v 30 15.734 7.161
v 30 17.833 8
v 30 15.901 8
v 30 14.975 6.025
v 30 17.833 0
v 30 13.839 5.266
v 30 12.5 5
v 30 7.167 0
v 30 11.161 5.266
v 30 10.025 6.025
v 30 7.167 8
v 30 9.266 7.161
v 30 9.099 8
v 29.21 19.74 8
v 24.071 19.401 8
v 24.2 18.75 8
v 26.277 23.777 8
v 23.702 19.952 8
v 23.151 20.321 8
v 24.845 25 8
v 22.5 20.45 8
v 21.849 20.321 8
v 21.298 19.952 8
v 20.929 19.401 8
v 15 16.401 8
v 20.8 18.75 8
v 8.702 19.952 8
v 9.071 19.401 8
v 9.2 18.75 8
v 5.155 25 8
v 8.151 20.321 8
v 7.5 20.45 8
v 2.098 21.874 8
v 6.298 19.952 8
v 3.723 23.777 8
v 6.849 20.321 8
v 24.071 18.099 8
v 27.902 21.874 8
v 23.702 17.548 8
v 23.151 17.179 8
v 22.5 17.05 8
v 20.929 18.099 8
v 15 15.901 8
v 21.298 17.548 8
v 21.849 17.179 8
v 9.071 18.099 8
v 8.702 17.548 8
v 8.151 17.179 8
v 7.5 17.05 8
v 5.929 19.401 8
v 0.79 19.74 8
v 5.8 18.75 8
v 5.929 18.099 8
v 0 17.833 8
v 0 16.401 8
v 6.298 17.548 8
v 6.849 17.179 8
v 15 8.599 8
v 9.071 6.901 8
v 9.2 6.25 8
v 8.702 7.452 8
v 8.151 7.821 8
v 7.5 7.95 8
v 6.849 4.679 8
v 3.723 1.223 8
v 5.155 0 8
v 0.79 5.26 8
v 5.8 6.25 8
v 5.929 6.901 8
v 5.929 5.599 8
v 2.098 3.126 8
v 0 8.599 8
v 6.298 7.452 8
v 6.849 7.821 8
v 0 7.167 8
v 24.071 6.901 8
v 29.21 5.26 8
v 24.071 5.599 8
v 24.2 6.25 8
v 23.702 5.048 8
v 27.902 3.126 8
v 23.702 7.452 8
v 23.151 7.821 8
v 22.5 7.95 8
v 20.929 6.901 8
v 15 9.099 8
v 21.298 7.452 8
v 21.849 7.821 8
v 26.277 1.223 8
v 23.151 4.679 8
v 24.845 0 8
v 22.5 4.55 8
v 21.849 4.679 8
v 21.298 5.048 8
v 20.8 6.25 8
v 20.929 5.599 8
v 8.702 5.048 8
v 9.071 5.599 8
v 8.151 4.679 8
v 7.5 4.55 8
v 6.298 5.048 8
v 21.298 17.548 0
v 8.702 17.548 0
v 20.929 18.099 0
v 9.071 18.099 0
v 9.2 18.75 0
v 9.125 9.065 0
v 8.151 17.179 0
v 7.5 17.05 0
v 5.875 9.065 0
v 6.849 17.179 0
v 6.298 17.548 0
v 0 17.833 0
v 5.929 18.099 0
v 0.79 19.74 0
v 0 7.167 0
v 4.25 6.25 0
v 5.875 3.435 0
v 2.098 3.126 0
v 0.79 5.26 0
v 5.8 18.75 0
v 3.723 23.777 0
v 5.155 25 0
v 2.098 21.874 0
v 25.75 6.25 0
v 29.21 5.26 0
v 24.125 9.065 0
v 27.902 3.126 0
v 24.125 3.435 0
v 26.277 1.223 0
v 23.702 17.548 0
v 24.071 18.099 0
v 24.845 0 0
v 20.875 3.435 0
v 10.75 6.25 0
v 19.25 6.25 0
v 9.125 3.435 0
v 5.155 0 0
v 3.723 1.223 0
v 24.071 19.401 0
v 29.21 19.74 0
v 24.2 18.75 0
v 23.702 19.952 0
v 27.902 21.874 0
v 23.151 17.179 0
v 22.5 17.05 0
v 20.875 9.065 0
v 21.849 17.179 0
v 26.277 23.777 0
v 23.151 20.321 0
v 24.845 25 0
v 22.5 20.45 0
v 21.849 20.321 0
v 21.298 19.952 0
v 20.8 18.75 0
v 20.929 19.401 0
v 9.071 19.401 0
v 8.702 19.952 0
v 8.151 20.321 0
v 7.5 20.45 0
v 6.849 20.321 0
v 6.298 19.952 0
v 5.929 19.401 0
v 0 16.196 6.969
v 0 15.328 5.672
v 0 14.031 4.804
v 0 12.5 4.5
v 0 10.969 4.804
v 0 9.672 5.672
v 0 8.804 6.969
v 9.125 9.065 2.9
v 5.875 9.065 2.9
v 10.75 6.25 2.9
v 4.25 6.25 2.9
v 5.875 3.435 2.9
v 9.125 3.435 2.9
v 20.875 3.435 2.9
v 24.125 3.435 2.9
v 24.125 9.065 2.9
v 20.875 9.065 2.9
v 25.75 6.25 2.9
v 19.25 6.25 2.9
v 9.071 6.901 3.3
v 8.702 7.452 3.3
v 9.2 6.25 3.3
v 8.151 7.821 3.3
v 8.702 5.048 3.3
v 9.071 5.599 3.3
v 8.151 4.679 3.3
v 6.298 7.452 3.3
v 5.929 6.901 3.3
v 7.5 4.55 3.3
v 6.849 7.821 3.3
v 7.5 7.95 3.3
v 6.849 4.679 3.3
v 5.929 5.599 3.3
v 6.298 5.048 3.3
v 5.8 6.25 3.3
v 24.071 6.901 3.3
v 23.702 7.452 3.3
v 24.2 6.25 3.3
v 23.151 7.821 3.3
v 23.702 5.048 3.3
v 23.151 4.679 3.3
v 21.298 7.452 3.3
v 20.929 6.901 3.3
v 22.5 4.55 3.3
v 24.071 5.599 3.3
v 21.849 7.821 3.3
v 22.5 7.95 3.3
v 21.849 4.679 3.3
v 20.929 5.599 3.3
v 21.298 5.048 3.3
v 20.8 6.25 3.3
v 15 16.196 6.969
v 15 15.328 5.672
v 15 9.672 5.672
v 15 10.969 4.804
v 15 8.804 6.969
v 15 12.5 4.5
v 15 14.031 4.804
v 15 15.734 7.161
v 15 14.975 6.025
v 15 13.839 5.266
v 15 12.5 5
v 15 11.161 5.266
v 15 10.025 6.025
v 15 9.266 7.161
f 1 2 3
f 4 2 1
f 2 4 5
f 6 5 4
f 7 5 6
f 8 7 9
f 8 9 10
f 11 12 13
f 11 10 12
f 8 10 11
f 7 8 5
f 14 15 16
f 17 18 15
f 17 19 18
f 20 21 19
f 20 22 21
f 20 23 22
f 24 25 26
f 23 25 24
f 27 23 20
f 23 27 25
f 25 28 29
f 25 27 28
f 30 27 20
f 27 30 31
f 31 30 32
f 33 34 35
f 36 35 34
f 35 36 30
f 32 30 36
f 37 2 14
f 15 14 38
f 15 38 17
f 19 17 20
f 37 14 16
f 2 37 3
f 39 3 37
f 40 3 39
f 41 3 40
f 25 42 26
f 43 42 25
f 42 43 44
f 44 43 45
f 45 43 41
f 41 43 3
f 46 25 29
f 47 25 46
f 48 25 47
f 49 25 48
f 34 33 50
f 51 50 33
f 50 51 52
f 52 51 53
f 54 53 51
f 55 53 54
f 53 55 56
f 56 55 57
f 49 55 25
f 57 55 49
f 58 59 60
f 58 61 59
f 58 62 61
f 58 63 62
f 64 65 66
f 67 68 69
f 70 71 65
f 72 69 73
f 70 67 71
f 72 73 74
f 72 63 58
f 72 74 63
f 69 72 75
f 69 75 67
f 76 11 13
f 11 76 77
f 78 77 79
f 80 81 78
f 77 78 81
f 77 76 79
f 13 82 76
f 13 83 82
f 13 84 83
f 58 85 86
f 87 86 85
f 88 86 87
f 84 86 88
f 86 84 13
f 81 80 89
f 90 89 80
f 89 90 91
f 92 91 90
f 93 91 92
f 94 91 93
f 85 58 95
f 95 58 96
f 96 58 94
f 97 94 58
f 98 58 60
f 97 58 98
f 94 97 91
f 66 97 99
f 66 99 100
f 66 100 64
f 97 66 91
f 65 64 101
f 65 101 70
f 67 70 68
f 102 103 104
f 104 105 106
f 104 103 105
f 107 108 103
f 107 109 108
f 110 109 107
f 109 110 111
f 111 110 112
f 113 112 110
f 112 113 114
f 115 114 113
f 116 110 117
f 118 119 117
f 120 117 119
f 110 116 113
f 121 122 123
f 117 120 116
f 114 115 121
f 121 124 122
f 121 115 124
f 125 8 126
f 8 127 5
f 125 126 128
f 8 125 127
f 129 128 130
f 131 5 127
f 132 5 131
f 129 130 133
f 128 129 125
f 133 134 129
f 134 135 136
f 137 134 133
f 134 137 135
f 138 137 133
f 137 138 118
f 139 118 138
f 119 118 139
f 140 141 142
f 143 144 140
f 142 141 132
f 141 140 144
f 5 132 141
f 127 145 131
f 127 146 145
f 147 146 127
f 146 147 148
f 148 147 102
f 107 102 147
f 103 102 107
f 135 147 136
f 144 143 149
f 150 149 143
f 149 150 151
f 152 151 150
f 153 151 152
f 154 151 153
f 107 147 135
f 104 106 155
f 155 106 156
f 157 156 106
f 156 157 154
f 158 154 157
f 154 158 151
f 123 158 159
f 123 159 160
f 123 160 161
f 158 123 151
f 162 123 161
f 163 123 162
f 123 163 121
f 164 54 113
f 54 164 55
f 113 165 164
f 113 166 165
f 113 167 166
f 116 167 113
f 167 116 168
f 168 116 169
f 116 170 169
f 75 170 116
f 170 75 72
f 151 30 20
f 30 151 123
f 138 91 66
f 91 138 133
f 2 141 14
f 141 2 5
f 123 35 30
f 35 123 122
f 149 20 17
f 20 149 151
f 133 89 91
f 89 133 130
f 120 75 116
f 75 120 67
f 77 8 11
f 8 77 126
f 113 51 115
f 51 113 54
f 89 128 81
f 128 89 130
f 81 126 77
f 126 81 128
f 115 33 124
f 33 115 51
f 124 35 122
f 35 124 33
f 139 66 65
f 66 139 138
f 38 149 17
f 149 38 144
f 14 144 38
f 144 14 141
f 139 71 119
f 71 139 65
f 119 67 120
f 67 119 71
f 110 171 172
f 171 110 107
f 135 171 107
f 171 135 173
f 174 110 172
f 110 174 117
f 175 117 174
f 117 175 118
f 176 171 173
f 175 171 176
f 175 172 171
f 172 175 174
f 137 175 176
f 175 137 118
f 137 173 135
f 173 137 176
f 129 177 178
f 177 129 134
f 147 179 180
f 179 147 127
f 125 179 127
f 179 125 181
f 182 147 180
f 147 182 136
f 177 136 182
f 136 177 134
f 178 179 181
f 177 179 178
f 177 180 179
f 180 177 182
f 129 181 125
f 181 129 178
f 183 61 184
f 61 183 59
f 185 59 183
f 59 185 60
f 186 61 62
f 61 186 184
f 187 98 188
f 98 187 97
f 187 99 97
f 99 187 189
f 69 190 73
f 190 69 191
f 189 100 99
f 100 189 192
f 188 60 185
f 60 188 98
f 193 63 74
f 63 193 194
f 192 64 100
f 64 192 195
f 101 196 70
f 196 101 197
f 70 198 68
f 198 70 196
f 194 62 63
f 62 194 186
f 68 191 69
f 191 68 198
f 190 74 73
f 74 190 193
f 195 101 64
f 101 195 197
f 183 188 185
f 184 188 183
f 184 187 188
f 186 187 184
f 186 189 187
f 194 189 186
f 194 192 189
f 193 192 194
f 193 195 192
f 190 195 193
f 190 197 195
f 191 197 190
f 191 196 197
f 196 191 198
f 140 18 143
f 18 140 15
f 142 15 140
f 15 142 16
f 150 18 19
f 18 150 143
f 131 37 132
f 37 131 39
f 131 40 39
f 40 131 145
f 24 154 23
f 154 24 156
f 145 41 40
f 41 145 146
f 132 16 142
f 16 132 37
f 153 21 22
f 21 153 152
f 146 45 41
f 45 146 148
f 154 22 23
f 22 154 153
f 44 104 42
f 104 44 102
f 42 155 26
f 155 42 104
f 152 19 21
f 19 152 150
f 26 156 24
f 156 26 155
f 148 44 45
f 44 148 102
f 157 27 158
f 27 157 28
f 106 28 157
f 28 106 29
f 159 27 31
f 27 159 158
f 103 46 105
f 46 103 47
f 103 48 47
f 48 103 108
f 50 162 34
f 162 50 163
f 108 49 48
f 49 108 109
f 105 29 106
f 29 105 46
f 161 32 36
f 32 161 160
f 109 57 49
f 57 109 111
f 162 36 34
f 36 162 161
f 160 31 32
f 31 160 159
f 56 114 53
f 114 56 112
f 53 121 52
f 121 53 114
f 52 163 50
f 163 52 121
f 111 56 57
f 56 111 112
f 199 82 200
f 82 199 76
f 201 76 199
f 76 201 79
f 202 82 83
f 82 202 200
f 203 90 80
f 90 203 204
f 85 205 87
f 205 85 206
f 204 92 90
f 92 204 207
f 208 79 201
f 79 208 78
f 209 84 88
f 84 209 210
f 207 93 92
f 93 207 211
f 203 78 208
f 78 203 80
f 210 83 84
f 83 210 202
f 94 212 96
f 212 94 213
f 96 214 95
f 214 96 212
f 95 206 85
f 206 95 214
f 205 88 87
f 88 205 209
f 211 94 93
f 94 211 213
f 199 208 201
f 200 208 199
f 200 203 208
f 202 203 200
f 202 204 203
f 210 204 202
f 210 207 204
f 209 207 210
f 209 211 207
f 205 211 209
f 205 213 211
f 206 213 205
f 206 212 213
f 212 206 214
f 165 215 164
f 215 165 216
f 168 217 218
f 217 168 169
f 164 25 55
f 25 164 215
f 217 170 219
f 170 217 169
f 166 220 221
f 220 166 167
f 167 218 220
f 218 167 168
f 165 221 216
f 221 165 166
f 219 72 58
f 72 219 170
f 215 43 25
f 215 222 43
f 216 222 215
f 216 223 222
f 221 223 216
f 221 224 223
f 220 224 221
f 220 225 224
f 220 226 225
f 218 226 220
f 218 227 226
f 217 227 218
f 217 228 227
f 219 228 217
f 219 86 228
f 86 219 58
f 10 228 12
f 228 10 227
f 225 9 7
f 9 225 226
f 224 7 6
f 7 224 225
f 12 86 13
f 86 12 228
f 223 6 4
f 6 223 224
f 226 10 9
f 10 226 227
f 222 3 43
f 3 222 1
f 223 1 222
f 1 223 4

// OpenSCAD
/*  Symmetric Prusia Z-coupling
    by Philip Hands <phil@hands.com>
    Copyright (C) 2011,
    distributed under the GNU GPL v2 (or later) license.
-   Inspired by:
    Yet Another Prusa Mendel Z Coupling by nophead
	is licensed under the Creative Commons - GNU GPL license.
*/

module coupling(x=30,y=25,z=8,s=8,m=7)
{
	difference()
	{
		intersection()
		{
			cube([x,y,z]);
			translate([x/2,y/2,0])  cylinder(h=z, r=sqrt(pow(x/2,2)+pow(max(s,m)/2+((y-max(s,m))/12),2)),$fn=40);
		}

		// Nut holes
		translate([x/4,y/4,-0.1]) cylinder(h=3, r=3.25, $fn=6);
		translate([x*3/4,y/4,-0.1]) cylinder(h=3, r=3.25, $fn=6);

		// bolt holes
		#translate([x/4,y/4,3.3]) cylinder(h=10, r=1.7, $fn=16);
		translate([x*3/4,y*3/4,-0.1]) cylinder(h=10, r=1.7, $fn=16);
		translate([x/4,y*3/4,-0.1]) cylinder(h=10, r=1.7, $fn=16);
		#translate([x*3/4,y/4,3.3]) cylinder(h=10, r=1.7, $fn=16);

		// dents for shafts
		translate([-1, y/2, z+0.5]) rotate([0,90,0]) cylinder(h=x/2+1, r=s/2, $fn=16);
		translate([x/2-1, y/2, z+0.5]) rotate([0,90,0]) cylinder(h=x/2+2, r=m/2, $fn=16);
	}
}

coupling();
//translate([0, 30, 0]) coupling();
//translate([35, 0, 0]) coupling();
//translate([35, 30, 0]) coupling();
